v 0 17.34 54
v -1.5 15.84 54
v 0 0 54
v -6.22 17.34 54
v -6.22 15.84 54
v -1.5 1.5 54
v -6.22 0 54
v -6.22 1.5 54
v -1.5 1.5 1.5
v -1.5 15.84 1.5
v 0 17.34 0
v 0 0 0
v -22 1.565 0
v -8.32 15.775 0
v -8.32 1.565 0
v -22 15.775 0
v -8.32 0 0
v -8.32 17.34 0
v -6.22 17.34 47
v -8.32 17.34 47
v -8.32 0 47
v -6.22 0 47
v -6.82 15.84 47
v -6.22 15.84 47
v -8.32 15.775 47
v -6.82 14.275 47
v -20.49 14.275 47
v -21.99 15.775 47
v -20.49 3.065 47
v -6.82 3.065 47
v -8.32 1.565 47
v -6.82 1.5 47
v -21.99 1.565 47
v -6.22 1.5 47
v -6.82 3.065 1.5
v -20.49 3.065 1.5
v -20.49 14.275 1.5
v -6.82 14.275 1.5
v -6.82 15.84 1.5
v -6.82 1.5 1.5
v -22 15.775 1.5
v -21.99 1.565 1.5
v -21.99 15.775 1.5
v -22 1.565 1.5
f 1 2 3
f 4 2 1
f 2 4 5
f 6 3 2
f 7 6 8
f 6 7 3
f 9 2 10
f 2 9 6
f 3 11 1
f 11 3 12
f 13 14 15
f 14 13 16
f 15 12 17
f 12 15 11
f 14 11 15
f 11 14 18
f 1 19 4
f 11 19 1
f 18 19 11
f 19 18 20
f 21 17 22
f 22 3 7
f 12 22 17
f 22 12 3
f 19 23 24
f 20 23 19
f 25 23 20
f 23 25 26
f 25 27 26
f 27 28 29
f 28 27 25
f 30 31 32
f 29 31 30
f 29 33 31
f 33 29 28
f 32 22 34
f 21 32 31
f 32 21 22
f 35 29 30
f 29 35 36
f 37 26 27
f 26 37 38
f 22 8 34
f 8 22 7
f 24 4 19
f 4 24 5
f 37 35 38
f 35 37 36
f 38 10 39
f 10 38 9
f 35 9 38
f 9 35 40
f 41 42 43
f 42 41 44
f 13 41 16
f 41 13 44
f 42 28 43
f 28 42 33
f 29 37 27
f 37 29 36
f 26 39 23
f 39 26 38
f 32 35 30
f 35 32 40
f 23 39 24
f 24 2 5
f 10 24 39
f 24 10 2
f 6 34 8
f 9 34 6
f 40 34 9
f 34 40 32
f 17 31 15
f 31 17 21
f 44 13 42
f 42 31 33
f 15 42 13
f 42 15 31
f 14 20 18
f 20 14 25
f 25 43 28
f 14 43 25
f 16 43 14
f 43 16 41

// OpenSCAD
brushHandleThickness = 4.72;
brushHandleWidth = 13.74;
bristleWidth=10.61;
bristleLength=14.28;
coverBottomLength=54;
coverTopLength=47;
wall = 1.5;
tolerance = 0.3;

module dummy() {}

nudge = 0.01;

totalThickness = bristleLength+brushHandleThickness;
adjWall = wall + (brushHandleWidth-bristleWidth)/2;

module cover() {
    render(convexity=2)
    intersection() {
        union() {
            difference() {
                union() {
                    cube([coverBottomLength,brushHandleWidth+2*tolerance+2*wall,wall]);
                    cube([coverTopLength,adjWall,wall+totalThickness]);
                    translate([0,brushHandleWidth+2*tolerance+2*wall-adjWall,0]) cube([coverTopLength,adjWall,totalThickness+wall]);
                    cube([coverBottomLength,adjWall,wall+brushHandleThickness]);
                    translate([0,brushHandleWidth+2*tolerance+2*wall-adjWall,0]) cube([coverBottomLength,adjWall,wall+brushHandleThickness]);
                cube([wall,brushHandleWidth+2*tolerance+2*wall,totalThickness+2*wall]);
                    translate([0,0,wall+totalThickness-nudge]) cube([coverTopLength,brushHandleWidth+2*tolerance+2*wall,wall]);
                }
                translate([wall,wall,wall]) cube([coverBottomLength,brushHandleWidth+2*tolerance,brushHandleThickness+2*tolerance]);
                translate([-nudge,-nudge,wall+brushHandleThickness+2*tolerance+wall]) cube([coverTopLength+nudge,adjWall-wall+nudge,wall+totalThickness]);
                translate([-nudge,brushHandleWidth+2*tolerance+2*wall-(adjWall-wall),wall+brushHandleThickness+2*tolerance+wall]) cube([coverTopLength+nudge,adjWall-wall+nudge,wall+totalThickness]);
            }
        }
        cube([coverBottomLength,brushHandleWidth+2*tolerance+2*wall,totalThickness+2*wall]);

    }
}

rotate([0,-90,0])
cover();
